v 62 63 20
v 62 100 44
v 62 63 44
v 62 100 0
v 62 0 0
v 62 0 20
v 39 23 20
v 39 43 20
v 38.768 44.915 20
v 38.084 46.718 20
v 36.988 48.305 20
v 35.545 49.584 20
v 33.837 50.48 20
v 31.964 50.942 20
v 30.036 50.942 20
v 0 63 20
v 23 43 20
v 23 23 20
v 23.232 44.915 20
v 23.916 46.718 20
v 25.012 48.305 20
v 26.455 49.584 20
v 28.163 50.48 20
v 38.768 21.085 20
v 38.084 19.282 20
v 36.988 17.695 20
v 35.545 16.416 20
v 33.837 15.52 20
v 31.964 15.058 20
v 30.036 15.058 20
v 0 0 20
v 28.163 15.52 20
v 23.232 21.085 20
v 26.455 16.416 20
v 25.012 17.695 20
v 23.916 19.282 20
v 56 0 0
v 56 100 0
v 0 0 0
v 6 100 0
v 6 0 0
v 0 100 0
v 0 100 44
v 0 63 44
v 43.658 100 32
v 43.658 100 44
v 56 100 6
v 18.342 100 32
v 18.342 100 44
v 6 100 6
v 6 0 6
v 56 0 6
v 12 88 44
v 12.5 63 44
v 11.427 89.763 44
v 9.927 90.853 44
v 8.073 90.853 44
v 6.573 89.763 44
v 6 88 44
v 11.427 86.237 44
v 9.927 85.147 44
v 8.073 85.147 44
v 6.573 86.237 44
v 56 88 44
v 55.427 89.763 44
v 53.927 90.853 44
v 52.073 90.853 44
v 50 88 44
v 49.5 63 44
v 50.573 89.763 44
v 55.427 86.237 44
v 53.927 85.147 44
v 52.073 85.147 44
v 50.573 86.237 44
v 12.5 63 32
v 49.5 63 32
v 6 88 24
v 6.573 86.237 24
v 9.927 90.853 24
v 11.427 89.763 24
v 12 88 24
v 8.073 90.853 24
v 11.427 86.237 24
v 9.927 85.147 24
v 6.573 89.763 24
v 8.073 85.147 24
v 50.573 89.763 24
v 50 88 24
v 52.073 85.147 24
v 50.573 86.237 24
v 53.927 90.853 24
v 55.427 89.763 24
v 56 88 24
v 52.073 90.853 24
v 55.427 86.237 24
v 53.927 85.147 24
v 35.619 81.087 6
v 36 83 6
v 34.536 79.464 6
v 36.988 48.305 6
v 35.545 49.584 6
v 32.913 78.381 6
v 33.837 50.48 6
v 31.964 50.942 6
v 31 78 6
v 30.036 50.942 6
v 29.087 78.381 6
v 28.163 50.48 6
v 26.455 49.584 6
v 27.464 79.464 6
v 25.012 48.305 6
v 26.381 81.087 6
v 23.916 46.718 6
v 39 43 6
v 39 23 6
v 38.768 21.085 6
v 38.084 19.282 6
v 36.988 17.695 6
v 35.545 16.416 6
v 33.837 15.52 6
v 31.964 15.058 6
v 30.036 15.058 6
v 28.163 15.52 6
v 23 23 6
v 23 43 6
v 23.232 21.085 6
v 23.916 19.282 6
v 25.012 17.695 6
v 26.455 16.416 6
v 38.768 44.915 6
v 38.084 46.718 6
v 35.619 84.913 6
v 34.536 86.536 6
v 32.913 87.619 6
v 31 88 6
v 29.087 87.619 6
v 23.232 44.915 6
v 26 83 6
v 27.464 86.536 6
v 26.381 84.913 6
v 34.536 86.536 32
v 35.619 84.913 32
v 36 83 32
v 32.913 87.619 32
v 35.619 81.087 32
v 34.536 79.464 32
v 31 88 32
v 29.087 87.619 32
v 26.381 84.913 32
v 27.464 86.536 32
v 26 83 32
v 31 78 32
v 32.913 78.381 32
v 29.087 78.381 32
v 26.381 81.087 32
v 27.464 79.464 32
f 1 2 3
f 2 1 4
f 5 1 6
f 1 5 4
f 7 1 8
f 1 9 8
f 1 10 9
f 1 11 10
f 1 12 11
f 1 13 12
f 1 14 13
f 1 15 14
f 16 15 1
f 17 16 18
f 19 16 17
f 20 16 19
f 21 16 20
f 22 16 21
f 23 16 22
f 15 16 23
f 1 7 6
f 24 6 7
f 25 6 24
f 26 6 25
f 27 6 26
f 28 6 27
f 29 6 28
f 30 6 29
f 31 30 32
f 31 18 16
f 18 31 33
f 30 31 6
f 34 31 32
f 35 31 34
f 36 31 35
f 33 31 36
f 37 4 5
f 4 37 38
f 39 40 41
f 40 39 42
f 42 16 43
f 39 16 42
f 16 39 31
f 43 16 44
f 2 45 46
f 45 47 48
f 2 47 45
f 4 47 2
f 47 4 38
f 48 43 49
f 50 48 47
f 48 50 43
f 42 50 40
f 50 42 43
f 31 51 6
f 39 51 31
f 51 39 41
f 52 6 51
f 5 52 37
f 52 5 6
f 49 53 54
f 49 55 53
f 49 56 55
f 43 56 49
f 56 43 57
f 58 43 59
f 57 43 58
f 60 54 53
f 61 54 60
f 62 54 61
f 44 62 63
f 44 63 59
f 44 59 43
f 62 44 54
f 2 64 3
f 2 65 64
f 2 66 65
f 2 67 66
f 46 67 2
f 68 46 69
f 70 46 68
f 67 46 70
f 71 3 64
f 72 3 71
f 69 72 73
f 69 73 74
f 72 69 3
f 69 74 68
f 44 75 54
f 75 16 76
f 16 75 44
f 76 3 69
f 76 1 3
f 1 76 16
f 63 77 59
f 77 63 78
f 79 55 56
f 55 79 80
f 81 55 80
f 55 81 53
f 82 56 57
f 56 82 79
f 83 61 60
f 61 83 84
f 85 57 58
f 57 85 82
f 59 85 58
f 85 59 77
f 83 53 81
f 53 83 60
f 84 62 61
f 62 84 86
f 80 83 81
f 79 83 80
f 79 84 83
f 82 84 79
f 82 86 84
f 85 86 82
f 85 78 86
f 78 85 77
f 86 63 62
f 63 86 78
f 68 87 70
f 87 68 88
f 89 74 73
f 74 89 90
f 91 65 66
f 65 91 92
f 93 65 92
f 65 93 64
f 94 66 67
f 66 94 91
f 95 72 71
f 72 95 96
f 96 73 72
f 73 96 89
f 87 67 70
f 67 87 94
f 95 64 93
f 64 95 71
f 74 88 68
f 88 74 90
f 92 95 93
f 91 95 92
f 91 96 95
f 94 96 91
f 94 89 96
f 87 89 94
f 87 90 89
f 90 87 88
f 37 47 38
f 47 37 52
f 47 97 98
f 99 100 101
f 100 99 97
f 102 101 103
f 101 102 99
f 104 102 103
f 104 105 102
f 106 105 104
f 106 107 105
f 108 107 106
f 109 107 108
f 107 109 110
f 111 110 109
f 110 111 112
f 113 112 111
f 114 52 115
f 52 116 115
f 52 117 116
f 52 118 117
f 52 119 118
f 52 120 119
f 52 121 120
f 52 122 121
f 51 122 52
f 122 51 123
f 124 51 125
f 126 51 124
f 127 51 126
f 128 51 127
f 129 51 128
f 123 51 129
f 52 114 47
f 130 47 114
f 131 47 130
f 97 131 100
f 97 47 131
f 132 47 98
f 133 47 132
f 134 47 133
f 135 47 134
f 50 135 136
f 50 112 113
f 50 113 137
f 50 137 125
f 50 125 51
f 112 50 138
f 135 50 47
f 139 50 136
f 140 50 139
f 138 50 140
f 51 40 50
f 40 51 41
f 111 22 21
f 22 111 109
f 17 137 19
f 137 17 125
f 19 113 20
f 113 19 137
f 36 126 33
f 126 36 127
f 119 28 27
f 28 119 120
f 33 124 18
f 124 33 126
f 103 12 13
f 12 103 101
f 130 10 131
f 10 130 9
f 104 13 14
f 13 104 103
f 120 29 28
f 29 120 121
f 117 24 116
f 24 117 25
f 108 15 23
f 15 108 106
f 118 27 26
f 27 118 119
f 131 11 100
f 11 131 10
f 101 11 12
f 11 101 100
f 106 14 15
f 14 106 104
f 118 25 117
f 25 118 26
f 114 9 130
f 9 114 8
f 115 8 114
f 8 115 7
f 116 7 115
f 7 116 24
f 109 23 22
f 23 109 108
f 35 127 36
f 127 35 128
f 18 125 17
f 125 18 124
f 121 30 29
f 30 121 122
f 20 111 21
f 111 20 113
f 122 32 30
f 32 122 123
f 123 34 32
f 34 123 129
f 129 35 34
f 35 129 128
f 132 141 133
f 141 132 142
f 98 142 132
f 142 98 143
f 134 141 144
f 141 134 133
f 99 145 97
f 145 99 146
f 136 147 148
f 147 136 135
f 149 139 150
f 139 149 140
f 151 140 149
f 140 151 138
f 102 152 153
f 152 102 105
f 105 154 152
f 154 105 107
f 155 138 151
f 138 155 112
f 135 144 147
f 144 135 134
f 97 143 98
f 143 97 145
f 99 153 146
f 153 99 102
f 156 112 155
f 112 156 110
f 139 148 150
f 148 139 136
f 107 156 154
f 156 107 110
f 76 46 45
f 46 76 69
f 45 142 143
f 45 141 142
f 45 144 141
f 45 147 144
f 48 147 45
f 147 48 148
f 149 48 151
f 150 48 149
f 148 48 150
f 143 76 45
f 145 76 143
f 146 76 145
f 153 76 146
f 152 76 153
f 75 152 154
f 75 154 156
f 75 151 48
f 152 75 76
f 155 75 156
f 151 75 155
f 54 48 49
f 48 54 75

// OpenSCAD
difference() {
    union() {
        cube([62, 100, 20]);
        translate([0, 100-37, 20])
        cube([62, 37, 44-20]);
    }
    
    translate([(62-50)/2, -1, -1])
    cube([50, 102, 6+1]);
        
    translate([31, 100-37-20-20,0])
    hull() {
        cylinder(r=8, h=21);
        translate([0,20, 0])
        cylinder(r=8, h=21);
    }
    
    translate([31, 100-37+20, 0])
    cylinder(d=10,h=45);
    
    translate([31-22, 100-12, 44-20]) {
        cylinder(d=6,h=21);
        translate([44,0,0])
        cylinder(d=6,h=21);
    }
    
    translate([(62-37)/2, 100-37-1, 44-12])
    hull() {
        cube([37, 1, 13]);
        translate([(37-25)/2,37+1, 0])
        cube([25, 1, 13]);
    }
}
